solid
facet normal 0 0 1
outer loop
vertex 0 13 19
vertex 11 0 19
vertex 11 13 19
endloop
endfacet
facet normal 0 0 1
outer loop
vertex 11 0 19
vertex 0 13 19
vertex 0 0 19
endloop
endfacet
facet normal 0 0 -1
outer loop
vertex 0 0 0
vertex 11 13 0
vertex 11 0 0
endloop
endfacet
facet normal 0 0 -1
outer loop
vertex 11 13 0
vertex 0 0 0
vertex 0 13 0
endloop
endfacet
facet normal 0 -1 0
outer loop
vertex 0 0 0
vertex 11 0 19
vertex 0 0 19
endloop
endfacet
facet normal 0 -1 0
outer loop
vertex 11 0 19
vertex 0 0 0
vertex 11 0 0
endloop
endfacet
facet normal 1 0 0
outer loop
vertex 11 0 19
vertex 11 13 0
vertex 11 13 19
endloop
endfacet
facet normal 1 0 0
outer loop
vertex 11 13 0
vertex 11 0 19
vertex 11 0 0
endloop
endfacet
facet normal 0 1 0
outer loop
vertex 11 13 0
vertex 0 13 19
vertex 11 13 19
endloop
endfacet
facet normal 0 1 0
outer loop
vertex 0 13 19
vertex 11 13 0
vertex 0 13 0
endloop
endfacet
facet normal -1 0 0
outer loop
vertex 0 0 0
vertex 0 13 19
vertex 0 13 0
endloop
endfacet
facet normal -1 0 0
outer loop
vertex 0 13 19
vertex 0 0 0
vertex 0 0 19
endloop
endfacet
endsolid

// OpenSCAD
// Generated by SolidPython 1.0.1 on 2020-07-29 00:39:26


cube(size = [11, 13, 19]);
/***********************************************
*********      SolidPython code:      **********
************************************************
 
# import packages: SolidPython
from solid import *
from solid.utils import *
from itertools import chain, combinations


class Resize:

    def __init__(self, scad_file):
        self.scad_file = scad_file
        #self.scad_file = import_scad(scad_file)
        # cone/cylinder param:
        self.r1 = 0
        self.r2 = 0
        self.h = 0
        # rectangular prism param:
        self.w = 0
        self.l = 0
        # ellipse param:
        self.r = 0

    # import OpenScad code (file name corresponds to shape)


    # classify shape + parameters
    def assign(self, param1, param2, param3):
        if self.scad_file == 'cone.scad':
            self.r1 = param1
            self.r2 = param2
            self.h = param3
        elif self.scad_file == 'cylinder.scad':
            self.r1 = param1
            self.r2 = param2
            self.h = param3
        elif self.scad_file == 'rectangularPrism.scad':
            self.h = param1
            self.l = param2
            self.w = param3
        else:
            self.r = param1
            self.h = param2

    # resize parameters
    def iterate(self):
        x = range(3, 20, 2)
        i = 1
        if self.scad_file == 'cone.scad':
            tempList = list(combinations(x, 2))
            for temp in tempList:
                param1 = temp[0]
                param2 = temp[1]
                filepath = 'produced_scad_files/' + 'cone' + str(param1) + '_' + str(param2) + '_' + '.scad'
                scad_render_to_file(cylinder(h=param1, r1=param2, r2=0), filepath)

        elif self.scad_file == 'cylinder.scad':
            tempList = list(combinations(x, 3))
            for temp in tempList:
                param1 = temp[0]
                param2 = temp[1]
                filepath = 'produced_scad_files/' + 'cylinder' + str(param1) + '_' + str(param2) + '_' + '.scad'
                scad_render_to_file(cylinder(h=param1, r1=param2, r2=param2), filepath)

        elif self.scad_file == 'rectangularPrism.scad':
            tempList = list(combinations(x, 3))
            for temp in tempList:
                param1 = temp[0]
                param2 = temp[1]
                param3 = temp[2]
                filepath = 'produced_scad_files/' + 'rectangularPrism' + str(param1) + '_' + str(param2) + '_' + str(
                    param3) + '.scad'
                scad_render_to_file(cube(size=(param1, param2, param3)), filepath)

        elif self.scad_file == 'ellipse.scad':
            tempList = list(combinations(x, 4))
            for temp in tempList:
                param1 = temp[0]
                param2 = temp[1]
                param3 = temp[2]
                param4 = temp[3]
                filepath = 'produced_scad_files/' + 'ellipse' + str(param1) + '_' + str(param2) + '_' + str(param3) + '_' + str(param4) + '.scad'
                scad_render_to_file(scale([param1, param2, param3])(sphere(r=param4)), filepath)

    def render_to_scadfile(self):
        scad_render_to_file(scad, 'example.scad') 
 
************************************************/
